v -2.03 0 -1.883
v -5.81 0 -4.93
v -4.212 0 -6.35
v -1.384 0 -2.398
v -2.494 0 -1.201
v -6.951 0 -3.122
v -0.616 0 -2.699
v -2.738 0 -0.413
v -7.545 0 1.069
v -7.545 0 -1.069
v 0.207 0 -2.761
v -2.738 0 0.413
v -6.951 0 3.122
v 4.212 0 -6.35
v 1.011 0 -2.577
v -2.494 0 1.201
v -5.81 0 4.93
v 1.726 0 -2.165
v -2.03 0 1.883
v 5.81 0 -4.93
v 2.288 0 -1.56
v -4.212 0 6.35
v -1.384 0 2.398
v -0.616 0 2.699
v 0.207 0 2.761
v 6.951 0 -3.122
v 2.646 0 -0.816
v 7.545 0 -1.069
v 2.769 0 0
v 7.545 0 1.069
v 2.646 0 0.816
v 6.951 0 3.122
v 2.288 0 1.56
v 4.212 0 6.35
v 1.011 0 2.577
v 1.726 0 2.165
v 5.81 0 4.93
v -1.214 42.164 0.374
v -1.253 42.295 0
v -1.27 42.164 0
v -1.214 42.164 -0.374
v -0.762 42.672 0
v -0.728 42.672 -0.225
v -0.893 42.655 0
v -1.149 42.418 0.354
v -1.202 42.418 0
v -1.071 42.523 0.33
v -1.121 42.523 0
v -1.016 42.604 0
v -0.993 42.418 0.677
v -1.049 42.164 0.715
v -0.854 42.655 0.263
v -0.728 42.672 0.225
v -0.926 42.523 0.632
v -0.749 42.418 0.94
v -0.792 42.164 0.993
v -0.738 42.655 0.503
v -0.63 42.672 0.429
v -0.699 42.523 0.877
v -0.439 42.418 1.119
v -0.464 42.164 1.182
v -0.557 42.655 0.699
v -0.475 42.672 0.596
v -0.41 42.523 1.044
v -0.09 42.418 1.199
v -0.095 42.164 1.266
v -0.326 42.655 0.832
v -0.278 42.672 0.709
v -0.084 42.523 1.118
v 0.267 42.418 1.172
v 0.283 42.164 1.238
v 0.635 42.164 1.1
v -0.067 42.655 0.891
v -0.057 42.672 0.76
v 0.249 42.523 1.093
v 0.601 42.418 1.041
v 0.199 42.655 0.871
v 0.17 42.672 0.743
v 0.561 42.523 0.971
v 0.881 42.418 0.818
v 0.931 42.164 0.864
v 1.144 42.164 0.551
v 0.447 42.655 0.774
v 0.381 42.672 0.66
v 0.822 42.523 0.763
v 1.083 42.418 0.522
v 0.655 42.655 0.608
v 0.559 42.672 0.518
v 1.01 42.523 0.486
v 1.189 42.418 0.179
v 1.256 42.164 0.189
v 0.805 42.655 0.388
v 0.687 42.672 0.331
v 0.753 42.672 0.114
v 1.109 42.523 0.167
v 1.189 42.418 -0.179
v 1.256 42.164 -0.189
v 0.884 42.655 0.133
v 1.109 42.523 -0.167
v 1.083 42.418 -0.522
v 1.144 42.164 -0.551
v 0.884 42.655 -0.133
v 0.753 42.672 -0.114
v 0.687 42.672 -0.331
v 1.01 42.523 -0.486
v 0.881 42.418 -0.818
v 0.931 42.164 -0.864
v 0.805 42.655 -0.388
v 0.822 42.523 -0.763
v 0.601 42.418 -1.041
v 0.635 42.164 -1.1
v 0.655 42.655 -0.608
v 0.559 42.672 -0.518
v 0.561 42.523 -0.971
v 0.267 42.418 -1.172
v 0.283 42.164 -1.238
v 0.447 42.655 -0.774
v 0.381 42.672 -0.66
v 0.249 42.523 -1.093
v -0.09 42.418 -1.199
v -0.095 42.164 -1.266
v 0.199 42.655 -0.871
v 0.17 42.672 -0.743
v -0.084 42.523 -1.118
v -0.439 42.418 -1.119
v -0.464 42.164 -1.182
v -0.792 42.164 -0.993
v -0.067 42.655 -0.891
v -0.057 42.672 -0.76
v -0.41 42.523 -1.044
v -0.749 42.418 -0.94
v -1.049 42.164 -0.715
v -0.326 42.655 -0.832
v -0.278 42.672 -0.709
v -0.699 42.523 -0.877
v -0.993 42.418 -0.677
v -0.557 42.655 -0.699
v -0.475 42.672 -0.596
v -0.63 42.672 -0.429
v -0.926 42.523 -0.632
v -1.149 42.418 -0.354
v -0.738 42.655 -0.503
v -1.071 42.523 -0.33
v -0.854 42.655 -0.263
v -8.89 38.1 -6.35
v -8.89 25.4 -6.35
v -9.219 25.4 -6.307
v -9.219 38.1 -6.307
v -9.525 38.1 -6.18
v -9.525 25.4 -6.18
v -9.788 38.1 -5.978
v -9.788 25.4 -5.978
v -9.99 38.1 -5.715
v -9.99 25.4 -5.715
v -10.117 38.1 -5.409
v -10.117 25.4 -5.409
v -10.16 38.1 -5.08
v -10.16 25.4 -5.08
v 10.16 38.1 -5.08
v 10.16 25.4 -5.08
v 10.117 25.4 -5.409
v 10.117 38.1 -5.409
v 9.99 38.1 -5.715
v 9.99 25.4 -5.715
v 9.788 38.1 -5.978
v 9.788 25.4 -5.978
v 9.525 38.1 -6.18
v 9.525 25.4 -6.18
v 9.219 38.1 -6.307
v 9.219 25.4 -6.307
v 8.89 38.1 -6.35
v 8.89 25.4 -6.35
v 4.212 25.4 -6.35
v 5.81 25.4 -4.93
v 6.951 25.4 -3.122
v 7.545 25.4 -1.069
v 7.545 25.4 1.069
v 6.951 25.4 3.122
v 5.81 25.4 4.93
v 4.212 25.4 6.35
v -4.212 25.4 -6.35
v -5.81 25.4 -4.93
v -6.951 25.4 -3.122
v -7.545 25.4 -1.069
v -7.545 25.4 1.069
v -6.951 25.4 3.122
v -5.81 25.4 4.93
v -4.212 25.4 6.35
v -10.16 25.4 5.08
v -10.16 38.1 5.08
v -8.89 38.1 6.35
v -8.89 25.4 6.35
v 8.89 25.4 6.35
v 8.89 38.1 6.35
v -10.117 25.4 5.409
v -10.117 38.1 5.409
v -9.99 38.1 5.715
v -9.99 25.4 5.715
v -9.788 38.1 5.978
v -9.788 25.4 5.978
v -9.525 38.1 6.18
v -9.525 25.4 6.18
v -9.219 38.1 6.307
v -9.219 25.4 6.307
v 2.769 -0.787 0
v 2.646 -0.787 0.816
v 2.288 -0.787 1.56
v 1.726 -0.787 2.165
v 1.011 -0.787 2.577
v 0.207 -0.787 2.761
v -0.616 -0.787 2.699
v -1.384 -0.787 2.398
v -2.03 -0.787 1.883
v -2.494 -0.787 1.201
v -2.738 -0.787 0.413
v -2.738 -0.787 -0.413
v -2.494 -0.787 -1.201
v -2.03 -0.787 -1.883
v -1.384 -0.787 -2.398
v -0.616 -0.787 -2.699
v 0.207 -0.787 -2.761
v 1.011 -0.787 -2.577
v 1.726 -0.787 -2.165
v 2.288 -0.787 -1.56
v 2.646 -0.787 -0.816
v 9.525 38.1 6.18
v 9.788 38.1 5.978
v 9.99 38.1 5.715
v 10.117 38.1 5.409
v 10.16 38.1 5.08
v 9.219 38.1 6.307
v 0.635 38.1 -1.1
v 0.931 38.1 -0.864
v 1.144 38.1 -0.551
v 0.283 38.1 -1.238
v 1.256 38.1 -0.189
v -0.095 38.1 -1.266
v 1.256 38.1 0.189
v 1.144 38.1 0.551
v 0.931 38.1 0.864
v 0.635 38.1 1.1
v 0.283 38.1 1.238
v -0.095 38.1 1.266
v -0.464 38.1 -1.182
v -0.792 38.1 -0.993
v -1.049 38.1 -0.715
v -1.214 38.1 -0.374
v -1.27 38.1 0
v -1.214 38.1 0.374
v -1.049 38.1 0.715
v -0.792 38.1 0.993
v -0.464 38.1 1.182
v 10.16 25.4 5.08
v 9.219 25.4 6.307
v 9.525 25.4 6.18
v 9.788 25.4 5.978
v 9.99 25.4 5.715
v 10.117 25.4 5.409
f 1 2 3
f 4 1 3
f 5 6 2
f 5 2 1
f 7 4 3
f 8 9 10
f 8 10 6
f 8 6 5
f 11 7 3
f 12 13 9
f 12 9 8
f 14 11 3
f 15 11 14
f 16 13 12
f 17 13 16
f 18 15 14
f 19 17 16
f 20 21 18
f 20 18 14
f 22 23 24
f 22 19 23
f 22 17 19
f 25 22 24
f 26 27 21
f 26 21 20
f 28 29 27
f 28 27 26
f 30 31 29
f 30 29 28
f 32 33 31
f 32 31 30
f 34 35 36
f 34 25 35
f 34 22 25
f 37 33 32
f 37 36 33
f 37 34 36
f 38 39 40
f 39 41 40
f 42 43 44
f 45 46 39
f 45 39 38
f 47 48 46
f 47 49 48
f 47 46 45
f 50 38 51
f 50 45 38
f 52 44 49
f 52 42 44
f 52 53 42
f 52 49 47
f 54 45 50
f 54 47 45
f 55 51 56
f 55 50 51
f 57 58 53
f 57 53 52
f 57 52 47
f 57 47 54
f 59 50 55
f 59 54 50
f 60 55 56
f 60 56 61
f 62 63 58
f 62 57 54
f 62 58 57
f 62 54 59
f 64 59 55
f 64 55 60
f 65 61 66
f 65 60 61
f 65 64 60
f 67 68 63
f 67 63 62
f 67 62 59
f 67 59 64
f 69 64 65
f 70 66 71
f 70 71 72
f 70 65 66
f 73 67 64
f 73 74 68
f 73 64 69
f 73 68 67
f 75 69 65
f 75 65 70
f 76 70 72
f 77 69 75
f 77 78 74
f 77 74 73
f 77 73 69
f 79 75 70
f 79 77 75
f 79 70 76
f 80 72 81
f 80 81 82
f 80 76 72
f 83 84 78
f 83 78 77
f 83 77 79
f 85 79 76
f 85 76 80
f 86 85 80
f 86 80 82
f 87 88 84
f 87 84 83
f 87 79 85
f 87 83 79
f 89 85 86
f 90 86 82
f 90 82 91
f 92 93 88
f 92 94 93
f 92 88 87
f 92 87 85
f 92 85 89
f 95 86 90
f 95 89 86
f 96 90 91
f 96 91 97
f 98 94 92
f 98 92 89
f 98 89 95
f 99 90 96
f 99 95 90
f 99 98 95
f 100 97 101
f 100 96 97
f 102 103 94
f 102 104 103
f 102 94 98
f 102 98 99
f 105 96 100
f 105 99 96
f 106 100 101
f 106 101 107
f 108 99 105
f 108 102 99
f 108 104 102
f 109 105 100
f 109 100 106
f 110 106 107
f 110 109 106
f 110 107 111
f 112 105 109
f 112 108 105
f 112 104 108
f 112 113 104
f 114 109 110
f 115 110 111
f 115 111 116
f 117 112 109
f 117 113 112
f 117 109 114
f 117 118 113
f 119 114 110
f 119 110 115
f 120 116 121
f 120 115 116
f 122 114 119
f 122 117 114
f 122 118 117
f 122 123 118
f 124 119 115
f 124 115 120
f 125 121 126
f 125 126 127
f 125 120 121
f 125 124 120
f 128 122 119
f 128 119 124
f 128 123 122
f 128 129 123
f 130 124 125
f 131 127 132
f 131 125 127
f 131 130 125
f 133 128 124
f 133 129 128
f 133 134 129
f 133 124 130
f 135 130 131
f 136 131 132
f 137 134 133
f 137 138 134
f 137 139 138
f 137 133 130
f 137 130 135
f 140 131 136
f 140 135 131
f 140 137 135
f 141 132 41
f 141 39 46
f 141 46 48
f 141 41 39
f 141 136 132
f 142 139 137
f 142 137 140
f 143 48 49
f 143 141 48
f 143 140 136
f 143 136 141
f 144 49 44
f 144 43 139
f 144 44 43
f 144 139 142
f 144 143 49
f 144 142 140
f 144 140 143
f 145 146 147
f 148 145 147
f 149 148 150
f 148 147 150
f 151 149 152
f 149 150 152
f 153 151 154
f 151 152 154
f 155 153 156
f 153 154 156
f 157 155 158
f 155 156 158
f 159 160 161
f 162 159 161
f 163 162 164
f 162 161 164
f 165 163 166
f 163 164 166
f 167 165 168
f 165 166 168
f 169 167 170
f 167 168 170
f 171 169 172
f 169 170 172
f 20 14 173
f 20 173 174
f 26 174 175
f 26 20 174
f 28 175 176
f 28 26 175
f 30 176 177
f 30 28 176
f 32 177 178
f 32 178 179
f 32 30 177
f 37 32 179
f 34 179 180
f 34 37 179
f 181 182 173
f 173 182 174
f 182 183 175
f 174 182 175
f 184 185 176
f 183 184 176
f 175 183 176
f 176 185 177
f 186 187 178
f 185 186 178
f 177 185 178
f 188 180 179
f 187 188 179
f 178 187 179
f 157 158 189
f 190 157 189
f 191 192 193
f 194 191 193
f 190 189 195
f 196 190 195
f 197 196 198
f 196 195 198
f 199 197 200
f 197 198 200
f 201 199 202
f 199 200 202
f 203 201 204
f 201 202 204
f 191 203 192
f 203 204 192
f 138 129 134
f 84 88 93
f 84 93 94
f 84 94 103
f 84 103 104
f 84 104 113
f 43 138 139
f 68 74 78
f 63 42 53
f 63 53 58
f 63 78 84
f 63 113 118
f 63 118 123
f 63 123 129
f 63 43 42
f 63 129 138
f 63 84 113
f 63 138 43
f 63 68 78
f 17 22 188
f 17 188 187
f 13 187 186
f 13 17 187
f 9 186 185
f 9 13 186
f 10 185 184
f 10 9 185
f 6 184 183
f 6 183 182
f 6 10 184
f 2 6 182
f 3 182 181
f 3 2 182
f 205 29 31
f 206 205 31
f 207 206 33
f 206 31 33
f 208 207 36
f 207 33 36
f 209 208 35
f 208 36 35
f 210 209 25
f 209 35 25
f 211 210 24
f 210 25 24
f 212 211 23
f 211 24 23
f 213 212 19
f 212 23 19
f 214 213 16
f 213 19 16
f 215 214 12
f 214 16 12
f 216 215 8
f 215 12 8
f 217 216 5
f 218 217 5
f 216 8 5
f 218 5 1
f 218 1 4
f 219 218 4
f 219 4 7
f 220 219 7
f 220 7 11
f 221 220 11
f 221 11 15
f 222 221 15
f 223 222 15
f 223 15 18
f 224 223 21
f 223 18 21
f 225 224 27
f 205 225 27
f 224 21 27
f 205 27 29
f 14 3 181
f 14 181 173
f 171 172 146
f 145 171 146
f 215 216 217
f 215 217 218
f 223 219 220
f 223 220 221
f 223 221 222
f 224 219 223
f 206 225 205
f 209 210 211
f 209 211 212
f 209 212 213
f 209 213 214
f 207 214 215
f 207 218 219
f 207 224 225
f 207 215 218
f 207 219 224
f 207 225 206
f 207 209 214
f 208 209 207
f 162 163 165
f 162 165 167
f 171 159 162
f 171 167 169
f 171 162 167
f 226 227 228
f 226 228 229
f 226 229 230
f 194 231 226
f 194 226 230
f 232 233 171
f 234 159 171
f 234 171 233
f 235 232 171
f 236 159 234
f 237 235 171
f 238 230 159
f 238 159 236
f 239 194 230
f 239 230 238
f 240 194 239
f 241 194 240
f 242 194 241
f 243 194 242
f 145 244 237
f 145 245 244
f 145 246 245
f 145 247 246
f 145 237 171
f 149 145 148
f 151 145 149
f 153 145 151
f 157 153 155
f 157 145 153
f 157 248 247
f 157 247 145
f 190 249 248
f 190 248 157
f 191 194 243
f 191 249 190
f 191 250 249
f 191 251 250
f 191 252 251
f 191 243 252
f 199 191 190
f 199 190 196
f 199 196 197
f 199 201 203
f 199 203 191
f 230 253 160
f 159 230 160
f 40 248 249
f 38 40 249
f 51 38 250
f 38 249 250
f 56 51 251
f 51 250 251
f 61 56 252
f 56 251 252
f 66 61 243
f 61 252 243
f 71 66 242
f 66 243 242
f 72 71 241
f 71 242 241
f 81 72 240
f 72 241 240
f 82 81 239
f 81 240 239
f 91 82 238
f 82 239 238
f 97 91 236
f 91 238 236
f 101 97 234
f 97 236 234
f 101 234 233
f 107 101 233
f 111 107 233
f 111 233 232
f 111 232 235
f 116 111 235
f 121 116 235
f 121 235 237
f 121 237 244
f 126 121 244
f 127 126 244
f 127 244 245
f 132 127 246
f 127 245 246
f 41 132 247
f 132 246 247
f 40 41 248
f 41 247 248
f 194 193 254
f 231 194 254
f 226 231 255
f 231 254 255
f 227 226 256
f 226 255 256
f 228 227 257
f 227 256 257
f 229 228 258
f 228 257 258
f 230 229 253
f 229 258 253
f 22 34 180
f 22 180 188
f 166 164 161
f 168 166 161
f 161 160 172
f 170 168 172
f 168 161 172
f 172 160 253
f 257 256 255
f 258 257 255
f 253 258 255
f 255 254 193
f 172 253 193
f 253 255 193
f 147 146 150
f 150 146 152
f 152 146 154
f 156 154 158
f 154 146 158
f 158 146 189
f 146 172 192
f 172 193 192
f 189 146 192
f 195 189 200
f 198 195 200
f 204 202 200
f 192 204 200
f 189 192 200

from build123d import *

# Parameters (mm, degrees)
F0_R     = 2.7686
F1_DEPTH = 25.4
F2_DEPTH = 0.7874
F4_DEPTH = 12.7
F5_R     = 1.27
F6_DEPTH = 4.572
F7_R     = 0.508


with BuildPart() as f1:
    # F0 (on Front) → F1 (new body)
    with BuildSketch(Plane.XZ):
        with BuildLine():
            Line((4.2121134838, 6.35), (-4.2121134838, 6.35))
            ThreePointArc((-4.2121134838, 6.35), (-7.62, 0), (-4.2121134838, -6.35))
            Line((-4.2121134838, -6.35), (4.2121134838, -6.35))
            ThreePointArc((4.2121134838, -6.35), (7.62, 0), (4.2121134838, 6.35))
        make_face()
        Circle(F0_R, mode=Mode.SUBTRACT)
        Circle(F0_R)
    extrude(amount=-F1_DEPTH)

    # F0 (on Front) → F2 (join)
    with BuildSketch(Plane.XZ):
        Circle(F0_R)
    extrude(amount=F2_DEPTH)


with BuildPart() as f4:
    # F3 (on face) → F4 (new body)
    with BuildSketch(Plane(origin=(0, 25.4, 0), x_dir=(-1, 0, 0), z_dir=(0, 1, 0))):
        with BuildLine():
            Line((8.89, 6.35), (4.2121134838, 6.35))
            ThreePointArc((4.2121134838, 6.35), (7.62, 0), (4.2121134838, -6.35))
            Line((4.2121134838, -6.35), (8.89, -6.35))
            ThreePointArc((8.89, -6.35), (9.7880256121, -5.9780256121), (10.16, -5.08))
            Line((10.16, -5.08), (10.16, 5.08))
            ThreePointArc((10.16, 5.08), (9.7880256121, 5.9780256121), (8.89, 6.35))
        make_face()
        with BuildLine():
            ThreePointArc((4.2121134838, -6.35), (7.62, 0), (4.2121134838, 6.35))
            Line((4.2121134838, 6.35), (-4.2121134838, 6.35))
            ThreePointArc((-4.2121134838, 6.35), (-7.62, 0), (-4.2121134838, -6.35))
            Line((-4.2121134838, -6.35), (4.2121134838, -6.35))
        make_face()
        with BuildLine():
            ThreePointArc((-4.2121134838, -6.35), (-7.62, 0), (-4.2121134838, 6.35))
            Line((-4.2121134838, 6.35), (-8.89, 6.35))
            ThreePointArc((-8.89, 6.35), (-9.7880256121, 5.9780256121), (-10.16, 5.08))
            Line((-10.16, 5.08), (-10.16, -5.08))
            ThreePointArc((-10.16, -5.08), (-9.7880256121, -5.9780256121), (-8.89, -6.35))
            Line((-8.89, -6.35), (-4.2121134838, -6.35))
        make_face()
    extrude(amount=F4_DEPTH)

    # F5 (on face) → F6 (join)
    with BuildSketch(Plane(origin=(0, 38.1, 0), x_dir=(-1, 0, 0), z_dir=(0, 1, 0))):
        Circle(F5_R)
    extrude(amount=F6_DEPTH)

    # F7
    f7_edges = [f4.edges().sort_by_distance(p)[0] for p in [
        (1.27, 42.672, 0),
    ]]
    fillet(f7_edges, radius=F7_R)


solid = Compound([f1.part, f4.part])
